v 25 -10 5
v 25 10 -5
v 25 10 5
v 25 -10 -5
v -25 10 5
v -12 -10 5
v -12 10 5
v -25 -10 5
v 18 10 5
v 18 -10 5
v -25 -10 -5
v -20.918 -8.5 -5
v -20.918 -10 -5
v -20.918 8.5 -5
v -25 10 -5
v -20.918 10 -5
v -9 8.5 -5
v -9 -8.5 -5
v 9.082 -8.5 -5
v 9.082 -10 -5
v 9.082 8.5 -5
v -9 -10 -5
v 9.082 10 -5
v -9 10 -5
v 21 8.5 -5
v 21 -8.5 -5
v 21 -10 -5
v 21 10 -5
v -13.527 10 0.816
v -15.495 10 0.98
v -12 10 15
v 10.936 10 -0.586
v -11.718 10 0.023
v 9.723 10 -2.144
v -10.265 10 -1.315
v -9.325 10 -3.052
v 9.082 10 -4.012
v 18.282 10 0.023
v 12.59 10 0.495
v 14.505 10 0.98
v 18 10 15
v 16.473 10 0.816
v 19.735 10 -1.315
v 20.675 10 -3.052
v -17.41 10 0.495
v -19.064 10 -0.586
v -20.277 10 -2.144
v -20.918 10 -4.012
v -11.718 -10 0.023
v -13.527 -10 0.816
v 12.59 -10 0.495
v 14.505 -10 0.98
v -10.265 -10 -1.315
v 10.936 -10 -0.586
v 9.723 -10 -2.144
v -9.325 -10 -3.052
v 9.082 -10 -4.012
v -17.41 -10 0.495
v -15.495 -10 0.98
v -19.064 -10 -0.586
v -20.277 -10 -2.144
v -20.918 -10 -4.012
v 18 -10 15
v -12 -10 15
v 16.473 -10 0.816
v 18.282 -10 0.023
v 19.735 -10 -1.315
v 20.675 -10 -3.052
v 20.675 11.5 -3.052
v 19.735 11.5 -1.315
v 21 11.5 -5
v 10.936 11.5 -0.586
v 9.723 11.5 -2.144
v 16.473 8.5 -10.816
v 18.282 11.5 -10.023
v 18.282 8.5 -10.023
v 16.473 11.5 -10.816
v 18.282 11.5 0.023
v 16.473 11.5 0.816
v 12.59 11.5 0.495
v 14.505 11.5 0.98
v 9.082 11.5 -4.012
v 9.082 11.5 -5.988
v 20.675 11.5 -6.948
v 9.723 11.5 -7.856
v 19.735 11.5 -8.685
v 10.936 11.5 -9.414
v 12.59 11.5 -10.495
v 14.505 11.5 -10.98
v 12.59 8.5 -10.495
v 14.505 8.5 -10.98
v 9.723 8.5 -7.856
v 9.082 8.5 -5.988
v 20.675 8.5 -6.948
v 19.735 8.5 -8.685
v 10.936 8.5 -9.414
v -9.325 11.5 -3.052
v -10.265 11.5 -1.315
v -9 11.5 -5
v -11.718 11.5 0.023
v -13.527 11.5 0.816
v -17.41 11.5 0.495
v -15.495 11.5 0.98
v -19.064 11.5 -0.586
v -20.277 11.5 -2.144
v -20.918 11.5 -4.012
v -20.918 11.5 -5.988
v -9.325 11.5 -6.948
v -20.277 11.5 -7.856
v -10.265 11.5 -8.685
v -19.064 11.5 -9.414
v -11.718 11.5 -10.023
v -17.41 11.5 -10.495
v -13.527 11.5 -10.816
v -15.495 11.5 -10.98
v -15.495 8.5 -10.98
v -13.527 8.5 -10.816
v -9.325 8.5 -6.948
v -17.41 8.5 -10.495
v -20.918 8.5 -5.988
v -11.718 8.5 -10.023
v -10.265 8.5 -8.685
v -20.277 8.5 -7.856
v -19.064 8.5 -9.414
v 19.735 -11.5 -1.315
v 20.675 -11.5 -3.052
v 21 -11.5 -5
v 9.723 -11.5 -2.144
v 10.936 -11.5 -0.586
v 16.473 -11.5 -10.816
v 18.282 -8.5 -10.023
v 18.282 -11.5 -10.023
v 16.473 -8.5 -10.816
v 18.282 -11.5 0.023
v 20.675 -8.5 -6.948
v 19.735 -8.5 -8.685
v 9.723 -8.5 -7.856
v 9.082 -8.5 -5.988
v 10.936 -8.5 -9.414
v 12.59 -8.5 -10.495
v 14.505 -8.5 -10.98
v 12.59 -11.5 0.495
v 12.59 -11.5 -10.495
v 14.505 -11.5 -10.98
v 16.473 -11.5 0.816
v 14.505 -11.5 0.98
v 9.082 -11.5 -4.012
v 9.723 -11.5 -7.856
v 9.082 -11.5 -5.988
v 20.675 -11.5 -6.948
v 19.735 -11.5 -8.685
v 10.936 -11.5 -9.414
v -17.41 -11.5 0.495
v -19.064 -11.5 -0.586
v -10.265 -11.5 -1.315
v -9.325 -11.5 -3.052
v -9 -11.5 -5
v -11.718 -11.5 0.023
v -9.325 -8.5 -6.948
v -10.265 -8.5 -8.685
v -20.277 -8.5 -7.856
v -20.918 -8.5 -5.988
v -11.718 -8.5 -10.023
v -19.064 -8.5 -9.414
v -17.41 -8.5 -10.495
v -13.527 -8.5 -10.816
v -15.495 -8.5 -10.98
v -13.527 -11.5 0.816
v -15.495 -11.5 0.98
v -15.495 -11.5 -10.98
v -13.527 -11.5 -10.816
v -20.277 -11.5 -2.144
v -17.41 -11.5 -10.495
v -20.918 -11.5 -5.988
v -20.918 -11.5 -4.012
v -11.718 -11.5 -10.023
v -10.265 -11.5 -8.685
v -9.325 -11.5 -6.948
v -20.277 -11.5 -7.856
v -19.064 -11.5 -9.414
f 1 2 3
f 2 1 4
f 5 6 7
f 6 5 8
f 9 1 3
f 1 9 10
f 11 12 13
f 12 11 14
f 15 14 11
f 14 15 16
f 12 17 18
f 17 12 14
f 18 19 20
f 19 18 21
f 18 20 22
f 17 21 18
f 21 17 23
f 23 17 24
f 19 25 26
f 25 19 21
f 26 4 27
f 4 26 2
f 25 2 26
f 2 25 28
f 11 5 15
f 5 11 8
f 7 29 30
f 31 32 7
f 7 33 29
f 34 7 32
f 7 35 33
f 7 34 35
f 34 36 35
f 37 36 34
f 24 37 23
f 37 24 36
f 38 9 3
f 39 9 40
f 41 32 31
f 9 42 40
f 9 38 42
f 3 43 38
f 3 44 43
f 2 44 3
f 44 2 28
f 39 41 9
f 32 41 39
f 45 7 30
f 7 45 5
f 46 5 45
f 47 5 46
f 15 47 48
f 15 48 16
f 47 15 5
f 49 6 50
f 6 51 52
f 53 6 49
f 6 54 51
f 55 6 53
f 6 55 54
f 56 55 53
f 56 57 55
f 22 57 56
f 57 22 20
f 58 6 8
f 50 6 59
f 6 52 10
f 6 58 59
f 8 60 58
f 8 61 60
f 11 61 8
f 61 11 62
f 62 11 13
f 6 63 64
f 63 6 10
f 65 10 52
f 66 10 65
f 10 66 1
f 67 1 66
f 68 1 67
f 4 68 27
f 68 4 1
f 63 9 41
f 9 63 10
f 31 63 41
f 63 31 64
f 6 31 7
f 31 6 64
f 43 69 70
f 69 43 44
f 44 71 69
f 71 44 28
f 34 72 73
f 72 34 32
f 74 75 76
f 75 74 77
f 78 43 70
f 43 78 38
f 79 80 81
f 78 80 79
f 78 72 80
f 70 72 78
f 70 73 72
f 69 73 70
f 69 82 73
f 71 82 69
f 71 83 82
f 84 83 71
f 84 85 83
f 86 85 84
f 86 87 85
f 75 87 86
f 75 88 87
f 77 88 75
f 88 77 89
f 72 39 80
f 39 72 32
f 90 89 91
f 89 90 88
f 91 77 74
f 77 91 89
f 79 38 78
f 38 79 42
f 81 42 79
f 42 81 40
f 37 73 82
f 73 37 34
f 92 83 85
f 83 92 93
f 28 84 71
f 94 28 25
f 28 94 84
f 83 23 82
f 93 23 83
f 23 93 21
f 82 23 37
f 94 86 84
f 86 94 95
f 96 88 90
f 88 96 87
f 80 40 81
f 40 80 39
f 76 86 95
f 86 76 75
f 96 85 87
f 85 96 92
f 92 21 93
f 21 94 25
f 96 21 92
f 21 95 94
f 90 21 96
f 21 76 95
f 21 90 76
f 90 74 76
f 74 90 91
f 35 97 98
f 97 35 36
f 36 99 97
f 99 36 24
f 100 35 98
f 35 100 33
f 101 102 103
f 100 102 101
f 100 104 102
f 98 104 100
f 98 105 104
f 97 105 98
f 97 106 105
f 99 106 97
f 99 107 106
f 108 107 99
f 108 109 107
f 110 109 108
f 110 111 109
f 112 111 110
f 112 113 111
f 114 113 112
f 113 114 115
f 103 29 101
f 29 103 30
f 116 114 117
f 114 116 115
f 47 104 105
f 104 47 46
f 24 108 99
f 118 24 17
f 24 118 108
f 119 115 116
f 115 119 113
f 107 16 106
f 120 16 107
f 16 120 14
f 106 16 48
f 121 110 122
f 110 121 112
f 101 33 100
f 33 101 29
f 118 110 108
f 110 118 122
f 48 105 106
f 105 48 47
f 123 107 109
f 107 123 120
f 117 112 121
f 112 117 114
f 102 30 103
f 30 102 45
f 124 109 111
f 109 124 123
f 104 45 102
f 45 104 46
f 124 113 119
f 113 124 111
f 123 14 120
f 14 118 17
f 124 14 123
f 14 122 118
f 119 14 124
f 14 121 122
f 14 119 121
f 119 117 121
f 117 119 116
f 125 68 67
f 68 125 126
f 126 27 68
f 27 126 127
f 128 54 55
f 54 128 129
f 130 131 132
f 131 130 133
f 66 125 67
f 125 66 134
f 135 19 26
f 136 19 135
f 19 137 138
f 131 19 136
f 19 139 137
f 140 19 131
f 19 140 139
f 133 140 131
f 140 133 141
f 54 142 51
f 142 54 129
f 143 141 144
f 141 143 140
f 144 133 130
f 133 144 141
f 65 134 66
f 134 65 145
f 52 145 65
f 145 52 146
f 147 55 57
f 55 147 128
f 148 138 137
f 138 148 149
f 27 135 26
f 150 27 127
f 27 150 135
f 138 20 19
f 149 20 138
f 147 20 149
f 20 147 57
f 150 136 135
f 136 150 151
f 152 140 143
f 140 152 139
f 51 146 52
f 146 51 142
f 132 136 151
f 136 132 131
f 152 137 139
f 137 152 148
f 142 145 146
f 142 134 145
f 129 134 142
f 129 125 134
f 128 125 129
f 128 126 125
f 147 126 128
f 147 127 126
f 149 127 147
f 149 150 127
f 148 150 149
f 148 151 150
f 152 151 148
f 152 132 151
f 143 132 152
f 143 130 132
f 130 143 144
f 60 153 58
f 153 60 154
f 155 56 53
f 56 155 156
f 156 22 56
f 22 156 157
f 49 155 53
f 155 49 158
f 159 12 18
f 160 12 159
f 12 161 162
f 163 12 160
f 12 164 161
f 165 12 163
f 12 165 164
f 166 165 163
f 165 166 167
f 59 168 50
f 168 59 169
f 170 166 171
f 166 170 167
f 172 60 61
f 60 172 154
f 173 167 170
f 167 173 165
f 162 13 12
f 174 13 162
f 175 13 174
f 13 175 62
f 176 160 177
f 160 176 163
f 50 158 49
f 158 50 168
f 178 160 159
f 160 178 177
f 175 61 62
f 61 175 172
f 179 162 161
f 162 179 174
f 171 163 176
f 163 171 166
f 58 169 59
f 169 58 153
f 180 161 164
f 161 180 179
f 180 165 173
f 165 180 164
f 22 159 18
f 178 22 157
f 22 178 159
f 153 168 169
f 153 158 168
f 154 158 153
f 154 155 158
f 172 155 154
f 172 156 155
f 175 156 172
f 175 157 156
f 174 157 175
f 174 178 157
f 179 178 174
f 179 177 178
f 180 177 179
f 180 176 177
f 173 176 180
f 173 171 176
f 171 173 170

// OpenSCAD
ws = 12 * (1+sin(20*$t));

color("red") 
translate([0,0,0])
cube([50,20,10], center = true);

color("black") 
translate([3,0,10])
cube([30,20,10], center = true); 

translate ([15,10,-5])
rotate([90,0,0])
cylinder(h=3,d =ws , center=true);

translate ([-15,10,-5])
rotate([90,0,0])
cylinder(h=3,d =ws , center=true);

translate ([15,-10,-5])
rotate([90,0,0])
cylinder(h=3,d =ws , center=true);

translate ([-15,-10,-5])
rotate([90,0,0])
cylinder(h=3,d =ws , center=true);
